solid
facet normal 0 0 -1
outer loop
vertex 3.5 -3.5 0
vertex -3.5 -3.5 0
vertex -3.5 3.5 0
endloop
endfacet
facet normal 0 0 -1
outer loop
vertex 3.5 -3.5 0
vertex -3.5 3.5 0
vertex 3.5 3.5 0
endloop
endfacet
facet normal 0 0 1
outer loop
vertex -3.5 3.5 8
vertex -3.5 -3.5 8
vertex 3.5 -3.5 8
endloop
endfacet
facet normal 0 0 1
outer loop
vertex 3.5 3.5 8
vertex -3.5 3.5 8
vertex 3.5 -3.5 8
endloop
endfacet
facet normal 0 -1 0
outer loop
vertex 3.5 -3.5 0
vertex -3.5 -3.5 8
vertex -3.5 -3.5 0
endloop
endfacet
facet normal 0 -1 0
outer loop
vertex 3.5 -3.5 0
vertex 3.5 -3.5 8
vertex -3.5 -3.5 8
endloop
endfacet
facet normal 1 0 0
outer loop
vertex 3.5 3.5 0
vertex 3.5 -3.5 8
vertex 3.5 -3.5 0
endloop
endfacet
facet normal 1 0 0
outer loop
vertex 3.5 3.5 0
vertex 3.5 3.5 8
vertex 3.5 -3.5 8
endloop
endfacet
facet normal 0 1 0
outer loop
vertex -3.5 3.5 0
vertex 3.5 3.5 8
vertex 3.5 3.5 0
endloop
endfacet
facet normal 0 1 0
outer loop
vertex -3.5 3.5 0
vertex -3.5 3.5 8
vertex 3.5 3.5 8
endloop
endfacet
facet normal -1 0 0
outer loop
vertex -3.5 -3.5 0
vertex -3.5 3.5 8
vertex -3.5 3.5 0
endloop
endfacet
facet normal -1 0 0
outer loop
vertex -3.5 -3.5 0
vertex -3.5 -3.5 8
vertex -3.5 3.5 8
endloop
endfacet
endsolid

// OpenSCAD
//Example made by M2MakerLab 


/* [Parameters group (aka "Tab")] */

//Variable Description (Optional)
//Variable_name = default value //Variable value options 

//Textbox
cube_name = "example cube";

//Spinbox
Square_side_lenght = 5;
//Square_side_lenght = 5; // 0.5 

//Slider (default step size 1)
cube_height = 8; //[1:30]

//Slider custom step size (0.05)
cube_top_scale = 1; // [0:0.05:4]

//Combo box for string
cube_color = "red"; //[green, blue, cyan, purple, orange, gray]

//Labeled combo box for numbers
cube_twist = 0; //[0:No twist, 20:Light twist, 60:Medium twist, 150:Heavy twist, 350:Extreme twist]

//Checkbox
Add_hole = false;


//Mesh resolution
$fn = 100;

//Here object code starts and parameters declaration ends 
color(cube_color)
linear_extrude(height= cube_height, 
               twist = cube_twist, 
               scale = cube_top_scale)
     if (Add_hole) //if add_hole is checked, add hole
       {
        difference(){
            square ([Square_side_lenght*1.4, Square_side_lenght*1.4], center = true);
    square([Square_side_lenght, Square_side_lenght],center = true);}
       }else{  //add_hole not checked
           square ([Square_side_lenght*1.4, Square_side_lenght*1.4], center = true);}
                


//For other parameters types/options see here: https://en.wikibooks.org/wiki/OpenSCAD_User_Manual/Customizer 
